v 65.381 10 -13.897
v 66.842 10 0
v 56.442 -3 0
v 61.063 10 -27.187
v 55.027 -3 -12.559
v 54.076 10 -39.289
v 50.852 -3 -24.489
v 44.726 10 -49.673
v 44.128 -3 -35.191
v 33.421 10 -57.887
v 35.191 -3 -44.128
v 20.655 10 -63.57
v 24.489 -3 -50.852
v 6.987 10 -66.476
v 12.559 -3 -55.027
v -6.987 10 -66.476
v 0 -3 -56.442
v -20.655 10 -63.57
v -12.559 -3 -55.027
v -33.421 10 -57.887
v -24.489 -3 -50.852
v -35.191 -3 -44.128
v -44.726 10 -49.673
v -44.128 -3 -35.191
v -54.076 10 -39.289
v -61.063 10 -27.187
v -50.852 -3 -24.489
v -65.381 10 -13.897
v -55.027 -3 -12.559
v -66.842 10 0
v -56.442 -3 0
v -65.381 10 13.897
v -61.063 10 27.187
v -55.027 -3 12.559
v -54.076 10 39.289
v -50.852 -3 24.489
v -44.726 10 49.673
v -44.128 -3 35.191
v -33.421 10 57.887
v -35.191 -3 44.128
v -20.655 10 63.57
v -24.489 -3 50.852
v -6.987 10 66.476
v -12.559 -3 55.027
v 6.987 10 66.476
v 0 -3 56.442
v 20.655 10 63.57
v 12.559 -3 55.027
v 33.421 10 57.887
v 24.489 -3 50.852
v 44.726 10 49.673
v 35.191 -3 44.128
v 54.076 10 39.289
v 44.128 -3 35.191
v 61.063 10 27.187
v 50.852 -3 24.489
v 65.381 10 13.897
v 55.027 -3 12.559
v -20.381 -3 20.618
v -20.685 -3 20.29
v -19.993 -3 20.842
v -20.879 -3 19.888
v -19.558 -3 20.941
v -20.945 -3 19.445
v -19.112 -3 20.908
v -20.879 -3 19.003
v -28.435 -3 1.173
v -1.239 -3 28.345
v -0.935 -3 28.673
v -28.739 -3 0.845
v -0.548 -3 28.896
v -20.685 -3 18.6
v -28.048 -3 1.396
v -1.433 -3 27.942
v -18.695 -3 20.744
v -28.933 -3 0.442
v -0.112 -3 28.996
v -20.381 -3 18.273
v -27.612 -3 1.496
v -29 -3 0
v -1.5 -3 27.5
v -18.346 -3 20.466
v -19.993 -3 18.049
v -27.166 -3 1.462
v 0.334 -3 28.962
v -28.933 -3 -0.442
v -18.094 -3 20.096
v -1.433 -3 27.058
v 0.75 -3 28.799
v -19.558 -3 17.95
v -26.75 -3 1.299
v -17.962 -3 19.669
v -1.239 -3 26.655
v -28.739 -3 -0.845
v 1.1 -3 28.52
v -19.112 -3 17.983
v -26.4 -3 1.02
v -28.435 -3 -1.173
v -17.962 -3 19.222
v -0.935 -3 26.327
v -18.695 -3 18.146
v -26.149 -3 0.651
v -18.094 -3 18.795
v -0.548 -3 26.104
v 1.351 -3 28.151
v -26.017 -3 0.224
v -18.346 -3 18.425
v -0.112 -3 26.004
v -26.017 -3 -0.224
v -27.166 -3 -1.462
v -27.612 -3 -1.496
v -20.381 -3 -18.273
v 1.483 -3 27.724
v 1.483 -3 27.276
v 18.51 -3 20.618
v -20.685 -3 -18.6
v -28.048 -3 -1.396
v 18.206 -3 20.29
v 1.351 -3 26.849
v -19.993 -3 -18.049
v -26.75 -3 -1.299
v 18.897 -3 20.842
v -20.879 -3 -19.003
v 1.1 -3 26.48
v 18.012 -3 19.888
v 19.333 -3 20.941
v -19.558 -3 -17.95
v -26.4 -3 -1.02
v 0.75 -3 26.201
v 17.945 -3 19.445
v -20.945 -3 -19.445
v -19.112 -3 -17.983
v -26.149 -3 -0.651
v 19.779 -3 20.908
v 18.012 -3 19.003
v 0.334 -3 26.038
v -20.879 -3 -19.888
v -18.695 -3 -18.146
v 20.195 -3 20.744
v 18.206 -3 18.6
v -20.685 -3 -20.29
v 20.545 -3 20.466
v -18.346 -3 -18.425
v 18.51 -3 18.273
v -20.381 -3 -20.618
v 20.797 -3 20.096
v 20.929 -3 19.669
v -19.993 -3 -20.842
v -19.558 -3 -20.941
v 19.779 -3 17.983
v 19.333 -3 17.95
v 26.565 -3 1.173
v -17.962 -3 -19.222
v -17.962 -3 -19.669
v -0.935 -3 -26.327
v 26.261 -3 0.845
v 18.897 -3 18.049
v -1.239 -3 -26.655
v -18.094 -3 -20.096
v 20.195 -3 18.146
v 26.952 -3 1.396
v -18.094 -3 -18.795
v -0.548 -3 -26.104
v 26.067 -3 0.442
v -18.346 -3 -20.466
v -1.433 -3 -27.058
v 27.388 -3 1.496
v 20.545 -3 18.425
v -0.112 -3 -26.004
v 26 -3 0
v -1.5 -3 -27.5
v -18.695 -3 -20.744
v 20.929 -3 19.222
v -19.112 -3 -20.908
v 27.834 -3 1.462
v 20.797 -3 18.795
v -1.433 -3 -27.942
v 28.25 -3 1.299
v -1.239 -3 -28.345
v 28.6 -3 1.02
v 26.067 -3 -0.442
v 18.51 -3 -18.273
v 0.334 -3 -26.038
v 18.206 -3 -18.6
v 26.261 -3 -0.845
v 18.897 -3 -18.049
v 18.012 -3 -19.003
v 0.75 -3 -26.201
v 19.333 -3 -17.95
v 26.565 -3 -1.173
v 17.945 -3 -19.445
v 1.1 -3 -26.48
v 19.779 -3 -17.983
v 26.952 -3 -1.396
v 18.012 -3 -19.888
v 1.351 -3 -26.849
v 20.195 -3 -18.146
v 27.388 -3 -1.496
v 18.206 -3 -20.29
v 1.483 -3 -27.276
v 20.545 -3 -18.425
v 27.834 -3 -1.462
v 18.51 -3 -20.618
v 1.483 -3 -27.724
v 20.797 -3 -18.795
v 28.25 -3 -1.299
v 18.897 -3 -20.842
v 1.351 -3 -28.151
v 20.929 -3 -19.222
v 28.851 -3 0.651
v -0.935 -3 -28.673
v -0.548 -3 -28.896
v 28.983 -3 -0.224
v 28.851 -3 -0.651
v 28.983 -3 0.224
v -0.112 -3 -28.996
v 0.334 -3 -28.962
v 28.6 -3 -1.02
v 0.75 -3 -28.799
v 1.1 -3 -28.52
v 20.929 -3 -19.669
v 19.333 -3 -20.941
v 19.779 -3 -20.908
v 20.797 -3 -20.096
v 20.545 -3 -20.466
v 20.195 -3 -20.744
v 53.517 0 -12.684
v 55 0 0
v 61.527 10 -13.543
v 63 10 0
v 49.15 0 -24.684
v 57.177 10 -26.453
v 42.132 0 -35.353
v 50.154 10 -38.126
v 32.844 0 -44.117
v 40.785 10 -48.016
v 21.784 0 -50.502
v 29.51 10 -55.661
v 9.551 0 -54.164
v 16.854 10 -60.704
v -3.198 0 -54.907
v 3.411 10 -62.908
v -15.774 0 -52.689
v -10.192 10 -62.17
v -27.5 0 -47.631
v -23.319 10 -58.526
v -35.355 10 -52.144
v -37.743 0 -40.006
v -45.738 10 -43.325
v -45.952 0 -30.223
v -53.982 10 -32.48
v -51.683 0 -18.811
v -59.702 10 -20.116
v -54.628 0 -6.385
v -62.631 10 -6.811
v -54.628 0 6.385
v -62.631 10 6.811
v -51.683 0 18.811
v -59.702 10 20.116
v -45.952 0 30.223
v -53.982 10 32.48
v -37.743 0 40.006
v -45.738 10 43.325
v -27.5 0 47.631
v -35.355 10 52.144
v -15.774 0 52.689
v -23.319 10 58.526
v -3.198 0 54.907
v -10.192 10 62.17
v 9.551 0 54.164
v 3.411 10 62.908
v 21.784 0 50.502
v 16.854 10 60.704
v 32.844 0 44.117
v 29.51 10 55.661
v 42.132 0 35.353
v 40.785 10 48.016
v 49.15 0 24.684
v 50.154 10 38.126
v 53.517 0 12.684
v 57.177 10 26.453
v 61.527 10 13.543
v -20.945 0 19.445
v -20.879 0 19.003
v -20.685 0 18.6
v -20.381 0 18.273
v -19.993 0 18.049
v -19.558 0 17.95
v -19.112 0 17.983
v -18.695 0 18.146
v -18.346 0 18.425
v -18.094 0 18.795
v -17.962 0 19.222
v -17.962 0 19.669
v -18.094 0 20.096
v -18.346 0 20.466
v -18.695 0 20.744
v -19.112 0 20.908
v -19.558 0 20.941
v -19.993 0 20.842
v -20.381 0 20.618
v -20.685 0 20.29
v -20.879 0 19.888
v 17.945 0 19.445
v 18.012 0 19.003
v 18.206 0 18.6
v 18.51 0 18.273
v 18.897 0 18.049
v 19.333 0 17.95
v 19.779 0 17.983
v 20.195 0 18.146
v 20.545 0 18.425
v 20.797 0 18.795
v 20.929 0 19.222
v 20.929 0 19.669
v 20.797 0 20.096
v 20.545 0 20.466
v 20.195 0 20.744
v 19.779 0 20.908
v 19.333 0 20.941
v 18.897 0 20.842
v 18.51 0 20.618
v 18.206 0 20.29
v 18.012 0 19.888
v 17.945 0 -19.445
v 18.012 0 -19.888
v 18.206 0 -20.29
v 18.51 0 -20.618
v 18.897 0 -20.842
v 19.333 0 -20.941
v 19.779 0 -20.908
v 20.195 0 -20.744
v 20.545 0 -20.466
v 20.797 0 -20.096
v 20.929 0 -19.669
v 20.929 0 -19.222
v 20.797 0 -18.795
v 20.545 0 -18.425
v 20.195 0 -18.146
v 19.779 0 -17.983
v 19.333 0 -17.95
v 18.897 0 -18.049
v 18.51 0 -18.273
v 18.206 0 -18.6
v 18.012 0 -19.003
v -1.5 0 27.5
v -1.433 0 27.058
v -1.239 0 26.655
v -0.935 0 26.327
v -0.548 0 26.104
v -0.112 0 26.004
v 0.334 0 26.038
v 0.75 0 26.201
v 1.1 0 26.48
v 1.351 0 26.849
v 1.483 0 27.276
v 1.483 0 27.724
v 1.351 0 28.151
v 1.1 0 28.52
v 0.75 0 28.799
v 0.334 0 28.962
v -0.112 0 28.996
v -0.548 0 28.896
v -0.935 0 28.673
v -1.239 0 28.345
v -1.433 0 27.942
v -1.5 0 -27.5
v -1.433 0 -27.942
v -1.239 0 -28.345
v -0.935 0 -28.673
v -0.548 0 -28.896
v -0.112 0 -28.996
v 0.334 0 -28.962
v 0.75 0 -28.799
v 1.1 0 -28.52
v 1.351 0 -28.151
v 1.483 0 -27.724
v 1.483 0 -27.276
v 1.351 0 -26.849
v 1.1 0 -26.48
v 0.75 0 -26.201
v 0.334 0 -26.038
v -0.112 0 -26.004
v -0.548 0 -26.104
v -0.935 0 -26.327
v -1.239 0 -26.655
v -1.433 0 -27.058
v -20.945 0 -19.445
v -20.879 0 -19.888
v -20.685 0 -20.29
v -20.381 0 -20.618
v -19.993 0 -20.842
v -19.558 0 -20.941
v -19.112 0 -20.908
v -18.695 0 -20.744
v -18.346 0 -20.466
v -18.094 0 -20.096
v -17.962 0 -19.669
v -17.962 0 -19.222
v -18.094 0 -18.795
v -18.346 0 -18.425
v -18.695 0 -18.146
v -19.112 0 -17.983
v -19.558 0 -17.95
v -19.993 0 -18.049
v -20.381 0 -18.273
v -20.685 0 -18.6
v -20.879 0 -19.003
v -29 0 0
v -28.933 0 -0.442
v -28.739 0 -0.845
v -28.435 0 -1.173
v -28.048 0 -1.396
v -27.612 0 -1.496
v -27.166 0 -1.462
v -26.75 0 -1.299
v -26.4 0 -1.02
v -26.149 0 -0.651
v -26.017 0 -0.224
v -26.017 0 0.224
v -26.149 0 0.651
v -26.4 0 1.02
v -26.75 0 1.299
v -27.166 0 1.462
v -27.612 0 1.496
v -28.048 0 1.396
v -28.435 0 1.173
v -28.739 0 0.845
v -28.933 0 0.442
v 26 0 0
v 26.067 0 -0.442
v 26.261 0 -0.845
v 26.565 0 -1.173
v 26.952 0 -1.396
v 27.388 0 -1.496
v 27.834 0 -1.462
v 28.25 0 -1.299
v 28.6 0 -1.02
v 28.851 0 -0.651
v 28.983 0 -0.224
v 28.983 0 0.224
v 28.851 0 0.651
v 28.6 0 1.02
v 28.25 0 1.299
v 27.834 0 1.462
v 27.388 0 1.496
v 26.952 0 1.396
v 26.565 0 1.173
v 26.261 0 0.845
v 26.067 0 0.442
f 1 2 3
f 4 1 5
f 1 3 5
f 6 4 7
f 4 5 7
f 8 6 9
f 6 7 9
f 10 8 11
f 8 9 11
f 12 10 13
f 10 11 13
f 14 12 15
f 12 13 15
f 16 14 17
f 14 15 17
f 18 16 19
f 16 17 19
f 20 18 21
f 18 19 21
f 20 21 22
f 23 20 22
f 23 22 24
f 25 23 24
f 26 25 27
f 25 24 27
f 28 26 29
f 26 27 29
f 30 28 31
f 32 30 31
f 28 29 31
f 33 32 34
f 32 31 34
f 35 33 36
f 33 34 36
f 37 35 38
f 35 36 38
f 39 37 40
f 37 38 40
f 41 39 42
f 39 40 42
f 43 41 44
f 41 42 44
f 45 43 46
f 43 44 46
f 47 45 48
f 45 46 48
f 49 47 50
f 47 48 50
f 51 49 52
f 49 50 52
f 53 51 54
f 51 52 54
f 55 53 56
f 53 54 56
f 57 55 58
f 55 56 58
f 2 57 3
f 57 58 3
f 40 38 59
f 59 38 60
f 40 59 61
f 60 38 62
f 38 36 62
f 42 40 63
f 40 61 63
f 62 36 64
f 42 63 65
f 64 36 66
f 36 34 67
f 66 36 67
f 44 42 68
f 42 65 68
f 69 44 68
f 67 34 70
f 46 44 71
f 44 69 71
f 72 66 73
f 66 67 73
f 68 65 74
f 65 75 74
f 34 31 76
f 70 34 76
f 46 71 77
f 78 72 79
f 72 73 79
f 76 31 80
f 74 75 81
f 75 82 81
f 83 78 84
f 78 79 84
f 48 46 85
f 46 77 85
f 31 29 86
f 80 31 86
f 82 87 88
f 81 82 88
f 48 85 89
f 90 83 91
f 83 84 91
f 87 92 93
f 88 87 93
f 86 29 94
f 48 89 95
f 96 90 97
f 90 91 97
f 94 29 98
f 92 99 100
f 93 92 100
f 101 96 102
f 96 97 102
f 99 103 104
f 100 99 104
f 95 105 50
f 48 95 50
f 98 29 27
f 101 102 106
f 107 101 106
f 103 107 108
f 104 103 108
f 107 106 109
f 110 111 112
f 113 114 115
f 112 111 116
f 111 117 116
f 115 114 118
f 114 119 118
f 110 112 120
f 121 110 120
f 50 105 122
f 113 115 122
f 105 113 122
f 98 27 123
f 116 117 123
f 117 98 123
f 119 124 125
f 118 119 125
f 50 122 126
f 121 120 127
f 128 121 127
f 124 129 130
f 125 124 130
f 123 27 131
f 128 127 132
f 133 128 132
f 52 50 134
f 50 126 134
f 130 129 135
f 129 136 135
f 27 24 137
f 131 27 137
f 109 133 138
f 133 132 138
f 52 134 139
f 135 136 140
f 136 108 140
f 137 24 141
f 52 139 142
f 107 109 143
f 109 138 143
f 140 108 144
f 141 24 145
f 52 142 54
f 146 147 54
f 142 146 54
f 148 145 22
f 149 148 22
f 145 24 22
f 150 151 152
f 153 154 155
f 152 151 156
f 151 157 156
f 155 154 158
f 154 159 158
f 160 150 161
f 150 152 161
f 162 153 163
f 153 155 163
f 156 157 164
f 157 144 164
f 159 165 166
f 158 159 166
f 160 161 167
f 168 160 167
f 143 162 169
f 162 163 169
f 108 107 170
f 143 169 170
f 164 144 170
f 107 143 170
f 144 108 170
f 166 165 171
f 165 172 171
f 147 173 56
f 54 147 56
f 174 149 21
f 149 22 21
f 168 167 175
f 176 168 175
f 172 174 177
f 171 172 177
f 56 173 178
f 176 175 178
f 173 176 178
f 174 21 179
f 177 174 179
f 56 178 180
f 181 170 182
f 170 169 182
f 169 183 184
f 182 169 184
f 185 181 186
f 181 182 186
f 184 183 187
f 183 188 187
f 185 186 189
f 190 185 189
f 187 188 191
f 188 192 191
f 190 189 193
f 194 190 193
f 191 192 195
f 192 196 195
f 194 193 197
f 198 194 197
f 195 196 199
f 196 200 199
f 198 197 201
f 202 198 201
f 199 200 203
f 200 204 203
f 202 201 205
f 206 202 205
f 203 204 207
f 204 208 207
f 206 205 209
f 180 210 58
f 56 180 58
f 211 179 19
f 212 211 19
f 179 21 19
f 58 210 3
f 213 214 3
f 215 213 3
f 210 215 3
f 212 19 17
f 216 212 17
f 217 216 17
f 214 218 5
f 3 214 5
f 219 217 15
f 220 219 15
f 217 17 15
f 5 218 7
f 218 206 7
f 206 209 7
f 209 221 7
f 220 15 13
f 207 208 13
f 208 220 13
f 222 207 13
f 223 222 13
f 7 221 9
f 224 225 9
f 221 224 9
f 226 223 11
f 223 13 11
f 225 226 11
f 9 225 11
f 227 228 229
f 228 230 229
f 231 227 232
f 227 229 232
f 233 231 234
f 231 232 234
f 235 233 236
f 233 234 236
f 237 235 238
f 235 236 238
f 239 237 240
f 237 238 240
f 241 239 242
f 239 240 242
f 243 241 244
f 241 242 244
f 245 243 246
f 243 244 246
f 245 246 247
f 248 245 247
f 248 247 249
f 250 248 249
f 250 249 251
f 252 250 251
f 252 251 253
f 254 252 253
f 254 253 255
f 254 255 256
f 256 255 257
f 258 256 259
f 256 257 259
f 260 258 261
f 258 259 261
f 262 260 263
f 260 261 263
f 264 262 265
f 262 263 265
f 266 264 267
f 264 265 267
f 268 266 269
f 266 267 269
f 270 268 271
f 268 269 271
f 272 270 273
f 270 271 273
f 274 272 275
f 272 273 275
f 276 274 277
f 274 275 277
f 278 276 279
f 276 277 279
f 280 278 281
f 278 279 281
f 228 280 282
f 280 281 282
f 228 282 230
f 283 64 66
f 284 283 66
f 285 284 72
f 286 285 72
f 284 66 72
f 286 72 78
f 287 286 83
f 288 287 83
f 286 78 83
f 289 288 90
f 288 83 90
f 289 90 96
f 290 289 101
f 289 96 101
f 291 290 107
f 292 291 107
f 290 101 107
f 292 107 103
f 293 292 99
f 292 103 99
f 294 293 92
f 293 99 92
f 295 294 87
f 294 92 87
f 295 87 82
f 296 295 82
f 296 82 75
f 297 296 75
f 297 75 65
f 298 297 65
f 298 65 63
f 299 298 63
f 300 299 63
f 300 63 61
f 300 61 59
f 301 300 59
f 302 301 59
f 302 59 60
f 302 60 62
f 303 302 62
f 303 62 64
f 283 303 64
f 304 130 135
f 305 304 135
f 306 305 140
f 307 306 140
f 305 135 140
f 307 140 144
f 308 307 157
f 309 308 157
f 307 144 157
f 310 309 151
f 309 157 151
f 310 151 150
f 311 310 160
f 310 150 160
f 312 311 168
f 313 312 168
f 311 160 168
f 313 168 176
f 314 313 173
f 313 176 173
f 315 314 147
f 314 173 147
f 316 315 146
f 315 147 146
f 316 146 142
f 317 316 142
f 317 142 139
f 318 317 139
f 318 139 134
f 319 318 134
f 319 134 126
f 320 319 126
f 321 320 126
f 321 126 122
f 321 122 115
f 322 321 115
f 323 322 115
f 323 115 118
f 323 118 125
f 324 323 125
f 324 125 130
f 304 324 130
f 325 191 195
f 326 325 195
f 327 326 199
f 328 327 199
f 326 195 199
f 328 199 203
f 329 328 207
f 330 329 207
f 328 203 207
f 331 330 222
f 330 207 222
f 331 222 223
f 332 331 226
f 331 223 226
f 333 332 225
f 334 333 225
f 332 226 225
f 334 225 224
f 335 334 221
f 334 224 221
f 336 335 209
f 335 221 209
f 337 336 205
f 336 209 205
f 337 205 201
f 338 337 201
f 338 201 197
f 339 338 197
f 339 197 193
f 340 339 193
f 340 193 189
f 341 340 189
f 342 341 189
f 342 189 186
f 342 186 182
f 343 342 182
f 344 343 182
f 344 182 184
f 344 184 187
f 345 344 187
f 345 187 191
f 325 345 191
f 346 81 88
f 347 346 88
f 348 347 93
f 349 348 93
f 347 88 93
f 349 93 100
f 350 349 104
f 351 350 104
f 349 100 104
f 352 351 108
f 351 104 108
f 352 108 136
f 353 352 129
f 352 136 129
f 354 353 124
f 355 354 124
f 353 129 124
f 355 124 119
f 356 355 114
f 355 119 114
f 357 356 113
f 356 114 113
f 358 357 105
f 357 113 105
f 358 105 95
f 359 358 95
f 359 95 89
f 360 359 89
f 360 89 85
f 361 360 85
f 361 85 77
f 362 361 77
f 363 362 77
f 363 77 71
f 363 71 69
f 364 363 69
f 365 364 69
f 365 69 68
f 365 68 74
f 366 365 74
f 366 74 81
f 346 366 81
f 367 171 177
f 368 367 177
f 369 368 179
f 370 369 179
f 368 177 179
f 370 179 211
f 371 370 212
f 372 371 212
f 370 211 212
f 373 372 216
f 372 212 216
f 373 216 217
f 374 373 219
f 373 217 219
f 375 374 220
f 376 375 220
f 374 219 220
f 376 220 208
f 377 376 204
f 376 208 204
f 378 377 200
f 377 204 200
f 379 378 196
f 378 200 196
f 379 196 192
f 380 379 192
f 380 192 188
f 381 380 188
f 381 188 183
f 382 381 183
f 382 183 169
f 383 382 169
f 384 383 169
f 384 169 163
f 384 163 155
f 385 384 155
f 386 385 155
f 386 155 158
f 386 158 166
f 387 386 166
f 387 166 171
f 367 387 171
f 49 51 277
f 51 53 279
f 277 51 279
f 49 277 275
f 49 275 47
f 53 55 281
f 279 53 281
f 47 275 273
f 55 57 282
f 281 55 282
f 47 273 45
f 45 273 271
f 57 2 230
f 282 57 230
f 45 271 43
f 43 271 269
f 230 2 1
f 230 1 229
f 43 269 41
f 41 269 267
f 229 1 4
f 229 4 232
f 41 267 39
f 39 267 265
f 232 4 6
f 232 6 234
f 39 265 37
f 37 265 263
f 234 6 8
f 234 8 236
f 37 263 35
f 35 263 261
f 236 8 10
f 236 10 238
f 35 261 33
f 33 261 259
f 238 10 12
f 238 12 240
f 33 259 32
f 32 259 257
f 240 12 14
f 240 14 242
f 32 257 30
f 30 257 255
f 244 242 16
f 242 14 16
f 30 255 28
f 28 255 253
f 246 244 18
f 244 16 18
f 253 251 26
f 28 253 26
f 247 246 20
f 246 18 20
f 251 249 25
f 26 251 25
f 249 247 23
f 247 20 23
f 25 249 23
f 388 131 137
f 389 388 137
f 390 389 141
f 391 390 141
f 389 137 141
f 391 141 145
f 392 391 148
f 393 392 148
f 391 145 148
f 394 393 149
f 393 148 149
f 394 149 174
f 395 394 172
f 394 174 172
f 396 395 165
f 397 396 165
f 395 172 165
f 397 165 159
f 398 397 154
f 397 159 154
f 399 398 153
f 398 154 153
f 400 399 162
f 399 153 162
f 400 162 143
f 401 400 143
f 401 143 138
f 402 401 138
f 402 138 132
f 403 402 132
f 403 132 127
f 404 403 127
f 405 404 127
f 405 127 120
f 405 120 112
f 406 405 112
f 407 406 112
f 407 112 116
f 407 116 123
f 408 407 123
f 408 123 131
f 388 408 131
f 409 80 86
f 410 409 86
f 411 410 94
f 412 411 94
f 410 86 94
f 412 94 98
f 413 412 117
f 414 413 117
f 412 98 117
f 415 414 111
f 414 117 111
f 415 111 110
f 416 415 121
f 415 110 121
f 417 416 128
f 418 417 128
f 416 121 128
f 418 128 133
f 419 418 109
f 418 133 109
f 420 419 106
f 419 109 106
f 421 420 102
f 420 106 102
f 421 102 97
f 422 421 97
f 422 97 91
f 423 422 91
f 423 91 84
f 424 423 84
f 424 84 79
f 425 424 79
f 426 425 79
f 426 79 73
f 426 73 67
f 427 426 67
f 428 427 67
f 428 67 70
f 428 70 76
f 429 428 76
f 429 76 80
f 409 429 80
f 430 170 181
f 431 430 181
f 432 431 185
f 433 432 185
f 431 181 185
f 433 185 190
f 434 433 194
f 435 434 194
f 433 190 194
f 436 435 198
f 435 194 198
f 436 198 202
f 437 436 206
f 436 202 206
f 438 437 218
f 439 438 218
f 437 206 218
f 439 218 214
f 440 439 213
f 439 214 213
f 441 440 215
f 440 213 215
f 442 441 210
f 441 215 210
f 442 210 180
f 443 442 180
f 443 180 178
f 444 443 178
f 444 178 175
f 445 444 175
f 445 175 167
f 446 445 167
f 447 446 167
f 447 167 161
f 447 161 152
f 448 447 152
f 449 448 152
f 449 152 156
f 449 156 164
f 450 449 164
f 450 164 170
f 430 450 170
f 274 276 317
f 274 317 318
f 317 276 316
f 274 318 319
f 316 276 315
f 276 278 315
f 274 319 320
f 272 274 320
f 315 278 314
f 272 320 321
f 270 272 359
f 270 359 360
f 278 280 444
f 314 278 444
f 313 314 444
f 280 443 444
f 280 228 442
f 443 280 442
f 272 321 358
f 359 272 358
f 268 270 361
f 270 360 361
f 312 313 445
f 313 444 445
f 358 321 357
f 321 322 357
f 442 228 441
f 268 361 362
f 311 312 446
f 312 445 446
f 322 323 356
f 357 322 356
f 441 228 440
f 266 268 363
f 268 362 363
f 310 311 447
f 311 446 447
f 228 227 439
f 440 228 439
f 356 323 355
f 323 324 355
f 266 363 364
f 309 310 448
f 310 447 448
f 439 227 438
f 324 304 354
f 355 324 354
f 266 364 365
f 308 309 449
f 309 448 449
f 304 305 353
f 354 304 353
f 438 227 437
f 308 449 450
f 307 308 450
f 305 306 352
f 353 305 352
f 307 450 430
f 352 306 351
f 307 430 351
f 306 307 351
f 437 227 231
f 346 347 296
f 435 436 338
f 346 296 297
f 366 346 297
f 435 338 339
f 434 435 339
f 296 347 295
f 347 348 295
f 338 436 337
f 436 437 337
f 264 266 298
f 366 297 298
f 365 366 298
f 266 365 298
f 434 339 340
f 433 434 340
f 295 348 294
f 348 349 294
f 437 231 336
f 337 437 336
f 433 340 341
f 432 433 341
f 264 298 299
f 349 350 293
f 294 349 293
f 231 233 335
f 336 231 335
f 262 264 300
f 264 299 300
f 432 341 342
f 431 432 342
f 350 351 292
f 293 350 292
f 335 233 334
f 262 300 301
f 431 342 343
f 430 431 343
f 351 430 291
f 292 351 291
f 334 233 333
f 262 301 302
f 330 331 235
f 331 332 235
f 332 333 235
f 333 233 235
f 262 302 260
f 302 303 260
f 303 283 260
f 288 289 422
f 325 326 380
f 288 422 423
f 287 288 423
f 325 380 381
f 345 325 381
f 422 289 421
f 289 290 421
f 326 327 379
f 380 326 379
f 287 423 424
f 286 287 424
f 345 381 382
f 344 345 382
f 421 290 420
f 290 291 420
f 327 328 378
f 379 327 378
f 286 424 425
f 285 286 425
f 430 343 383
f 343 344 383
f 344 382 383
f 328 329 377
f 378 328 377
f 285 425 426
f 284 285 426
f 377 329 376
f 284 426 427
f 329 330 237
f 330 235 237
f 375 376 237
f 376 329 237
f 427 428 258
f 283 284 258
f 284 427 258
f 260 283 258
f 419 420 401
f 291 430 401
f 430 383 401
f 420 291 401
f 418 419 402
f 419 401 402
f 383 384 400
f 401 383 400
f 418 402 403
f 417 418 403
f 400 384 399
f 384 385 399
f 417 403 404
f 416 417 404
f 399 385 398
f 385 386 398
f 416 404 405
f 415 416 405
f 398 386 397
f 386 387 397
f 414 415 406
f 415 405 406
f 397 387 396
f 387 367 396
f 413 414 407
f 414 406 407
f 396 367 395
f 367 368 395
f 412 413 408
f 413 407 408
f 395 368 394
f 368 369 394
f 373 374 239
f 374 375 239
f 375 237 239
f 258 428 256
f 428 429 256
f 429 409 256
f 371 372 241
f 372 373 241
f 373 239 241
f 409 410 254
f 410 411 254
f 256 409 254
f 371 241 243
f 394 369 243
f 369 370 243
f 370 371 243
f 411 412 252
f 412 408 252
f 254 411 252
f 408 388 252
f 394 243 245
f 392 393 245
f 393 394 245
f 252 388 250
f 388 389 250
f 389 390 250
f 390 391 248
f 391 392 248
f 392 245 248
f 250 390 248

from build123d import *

# Parameters (mm, degrees)
SKETCH2_R          = 1.5
CUT_EXTRUDE1_DEPTH = 14


with BuildPart() as part:
    # Sketch1 → Revolve1 (revolve)
    with BuildSketch(Plane.XY):
        Polygon((55, 0), (63, 10), (66.841874542, 10), (56.441874542, -3), (0, -3), (0, 0), align=None)
    revolve(axis=Axis((0, -3, 0), (0, 1, 0)))

    # Sketch2 → Cut-Extrude1 (cut, through all)
    with BuildSketch(Plane(origin=(0, -3, 0), x_dir=(-1, 0, 0), z_dir=(0, -1, 0))):
        with Locations((0, -27.5)):
            Circle(SKETCH2_R)
        with Locations((-19.445436483, -19.445436483)):
            Circle(SKETCH2_R)
        with Locations((-27.5, 0)):
            Circle(SKETCH2_R)
        with Locations((-19.445436483, 19.445436483)):
            Circle(SKETCH2_R)
        with Locations((0, 27.5)):
            Circle(SKETCH2_R)
        with Locations((19.445436483, 19.445436483)):
            Circle(SKETCH2_R)
        with Locations((27.5, 0)):
            Circle(SKETCH2_R)
        with Locations((19.445436483, -19.445436483)):
            Circle(SKETCH2_R)
    extrude(amount=-CUT_EXTRUDE1_DEPTH, mode=Mode.SUBTRACT)


solid = part.part
